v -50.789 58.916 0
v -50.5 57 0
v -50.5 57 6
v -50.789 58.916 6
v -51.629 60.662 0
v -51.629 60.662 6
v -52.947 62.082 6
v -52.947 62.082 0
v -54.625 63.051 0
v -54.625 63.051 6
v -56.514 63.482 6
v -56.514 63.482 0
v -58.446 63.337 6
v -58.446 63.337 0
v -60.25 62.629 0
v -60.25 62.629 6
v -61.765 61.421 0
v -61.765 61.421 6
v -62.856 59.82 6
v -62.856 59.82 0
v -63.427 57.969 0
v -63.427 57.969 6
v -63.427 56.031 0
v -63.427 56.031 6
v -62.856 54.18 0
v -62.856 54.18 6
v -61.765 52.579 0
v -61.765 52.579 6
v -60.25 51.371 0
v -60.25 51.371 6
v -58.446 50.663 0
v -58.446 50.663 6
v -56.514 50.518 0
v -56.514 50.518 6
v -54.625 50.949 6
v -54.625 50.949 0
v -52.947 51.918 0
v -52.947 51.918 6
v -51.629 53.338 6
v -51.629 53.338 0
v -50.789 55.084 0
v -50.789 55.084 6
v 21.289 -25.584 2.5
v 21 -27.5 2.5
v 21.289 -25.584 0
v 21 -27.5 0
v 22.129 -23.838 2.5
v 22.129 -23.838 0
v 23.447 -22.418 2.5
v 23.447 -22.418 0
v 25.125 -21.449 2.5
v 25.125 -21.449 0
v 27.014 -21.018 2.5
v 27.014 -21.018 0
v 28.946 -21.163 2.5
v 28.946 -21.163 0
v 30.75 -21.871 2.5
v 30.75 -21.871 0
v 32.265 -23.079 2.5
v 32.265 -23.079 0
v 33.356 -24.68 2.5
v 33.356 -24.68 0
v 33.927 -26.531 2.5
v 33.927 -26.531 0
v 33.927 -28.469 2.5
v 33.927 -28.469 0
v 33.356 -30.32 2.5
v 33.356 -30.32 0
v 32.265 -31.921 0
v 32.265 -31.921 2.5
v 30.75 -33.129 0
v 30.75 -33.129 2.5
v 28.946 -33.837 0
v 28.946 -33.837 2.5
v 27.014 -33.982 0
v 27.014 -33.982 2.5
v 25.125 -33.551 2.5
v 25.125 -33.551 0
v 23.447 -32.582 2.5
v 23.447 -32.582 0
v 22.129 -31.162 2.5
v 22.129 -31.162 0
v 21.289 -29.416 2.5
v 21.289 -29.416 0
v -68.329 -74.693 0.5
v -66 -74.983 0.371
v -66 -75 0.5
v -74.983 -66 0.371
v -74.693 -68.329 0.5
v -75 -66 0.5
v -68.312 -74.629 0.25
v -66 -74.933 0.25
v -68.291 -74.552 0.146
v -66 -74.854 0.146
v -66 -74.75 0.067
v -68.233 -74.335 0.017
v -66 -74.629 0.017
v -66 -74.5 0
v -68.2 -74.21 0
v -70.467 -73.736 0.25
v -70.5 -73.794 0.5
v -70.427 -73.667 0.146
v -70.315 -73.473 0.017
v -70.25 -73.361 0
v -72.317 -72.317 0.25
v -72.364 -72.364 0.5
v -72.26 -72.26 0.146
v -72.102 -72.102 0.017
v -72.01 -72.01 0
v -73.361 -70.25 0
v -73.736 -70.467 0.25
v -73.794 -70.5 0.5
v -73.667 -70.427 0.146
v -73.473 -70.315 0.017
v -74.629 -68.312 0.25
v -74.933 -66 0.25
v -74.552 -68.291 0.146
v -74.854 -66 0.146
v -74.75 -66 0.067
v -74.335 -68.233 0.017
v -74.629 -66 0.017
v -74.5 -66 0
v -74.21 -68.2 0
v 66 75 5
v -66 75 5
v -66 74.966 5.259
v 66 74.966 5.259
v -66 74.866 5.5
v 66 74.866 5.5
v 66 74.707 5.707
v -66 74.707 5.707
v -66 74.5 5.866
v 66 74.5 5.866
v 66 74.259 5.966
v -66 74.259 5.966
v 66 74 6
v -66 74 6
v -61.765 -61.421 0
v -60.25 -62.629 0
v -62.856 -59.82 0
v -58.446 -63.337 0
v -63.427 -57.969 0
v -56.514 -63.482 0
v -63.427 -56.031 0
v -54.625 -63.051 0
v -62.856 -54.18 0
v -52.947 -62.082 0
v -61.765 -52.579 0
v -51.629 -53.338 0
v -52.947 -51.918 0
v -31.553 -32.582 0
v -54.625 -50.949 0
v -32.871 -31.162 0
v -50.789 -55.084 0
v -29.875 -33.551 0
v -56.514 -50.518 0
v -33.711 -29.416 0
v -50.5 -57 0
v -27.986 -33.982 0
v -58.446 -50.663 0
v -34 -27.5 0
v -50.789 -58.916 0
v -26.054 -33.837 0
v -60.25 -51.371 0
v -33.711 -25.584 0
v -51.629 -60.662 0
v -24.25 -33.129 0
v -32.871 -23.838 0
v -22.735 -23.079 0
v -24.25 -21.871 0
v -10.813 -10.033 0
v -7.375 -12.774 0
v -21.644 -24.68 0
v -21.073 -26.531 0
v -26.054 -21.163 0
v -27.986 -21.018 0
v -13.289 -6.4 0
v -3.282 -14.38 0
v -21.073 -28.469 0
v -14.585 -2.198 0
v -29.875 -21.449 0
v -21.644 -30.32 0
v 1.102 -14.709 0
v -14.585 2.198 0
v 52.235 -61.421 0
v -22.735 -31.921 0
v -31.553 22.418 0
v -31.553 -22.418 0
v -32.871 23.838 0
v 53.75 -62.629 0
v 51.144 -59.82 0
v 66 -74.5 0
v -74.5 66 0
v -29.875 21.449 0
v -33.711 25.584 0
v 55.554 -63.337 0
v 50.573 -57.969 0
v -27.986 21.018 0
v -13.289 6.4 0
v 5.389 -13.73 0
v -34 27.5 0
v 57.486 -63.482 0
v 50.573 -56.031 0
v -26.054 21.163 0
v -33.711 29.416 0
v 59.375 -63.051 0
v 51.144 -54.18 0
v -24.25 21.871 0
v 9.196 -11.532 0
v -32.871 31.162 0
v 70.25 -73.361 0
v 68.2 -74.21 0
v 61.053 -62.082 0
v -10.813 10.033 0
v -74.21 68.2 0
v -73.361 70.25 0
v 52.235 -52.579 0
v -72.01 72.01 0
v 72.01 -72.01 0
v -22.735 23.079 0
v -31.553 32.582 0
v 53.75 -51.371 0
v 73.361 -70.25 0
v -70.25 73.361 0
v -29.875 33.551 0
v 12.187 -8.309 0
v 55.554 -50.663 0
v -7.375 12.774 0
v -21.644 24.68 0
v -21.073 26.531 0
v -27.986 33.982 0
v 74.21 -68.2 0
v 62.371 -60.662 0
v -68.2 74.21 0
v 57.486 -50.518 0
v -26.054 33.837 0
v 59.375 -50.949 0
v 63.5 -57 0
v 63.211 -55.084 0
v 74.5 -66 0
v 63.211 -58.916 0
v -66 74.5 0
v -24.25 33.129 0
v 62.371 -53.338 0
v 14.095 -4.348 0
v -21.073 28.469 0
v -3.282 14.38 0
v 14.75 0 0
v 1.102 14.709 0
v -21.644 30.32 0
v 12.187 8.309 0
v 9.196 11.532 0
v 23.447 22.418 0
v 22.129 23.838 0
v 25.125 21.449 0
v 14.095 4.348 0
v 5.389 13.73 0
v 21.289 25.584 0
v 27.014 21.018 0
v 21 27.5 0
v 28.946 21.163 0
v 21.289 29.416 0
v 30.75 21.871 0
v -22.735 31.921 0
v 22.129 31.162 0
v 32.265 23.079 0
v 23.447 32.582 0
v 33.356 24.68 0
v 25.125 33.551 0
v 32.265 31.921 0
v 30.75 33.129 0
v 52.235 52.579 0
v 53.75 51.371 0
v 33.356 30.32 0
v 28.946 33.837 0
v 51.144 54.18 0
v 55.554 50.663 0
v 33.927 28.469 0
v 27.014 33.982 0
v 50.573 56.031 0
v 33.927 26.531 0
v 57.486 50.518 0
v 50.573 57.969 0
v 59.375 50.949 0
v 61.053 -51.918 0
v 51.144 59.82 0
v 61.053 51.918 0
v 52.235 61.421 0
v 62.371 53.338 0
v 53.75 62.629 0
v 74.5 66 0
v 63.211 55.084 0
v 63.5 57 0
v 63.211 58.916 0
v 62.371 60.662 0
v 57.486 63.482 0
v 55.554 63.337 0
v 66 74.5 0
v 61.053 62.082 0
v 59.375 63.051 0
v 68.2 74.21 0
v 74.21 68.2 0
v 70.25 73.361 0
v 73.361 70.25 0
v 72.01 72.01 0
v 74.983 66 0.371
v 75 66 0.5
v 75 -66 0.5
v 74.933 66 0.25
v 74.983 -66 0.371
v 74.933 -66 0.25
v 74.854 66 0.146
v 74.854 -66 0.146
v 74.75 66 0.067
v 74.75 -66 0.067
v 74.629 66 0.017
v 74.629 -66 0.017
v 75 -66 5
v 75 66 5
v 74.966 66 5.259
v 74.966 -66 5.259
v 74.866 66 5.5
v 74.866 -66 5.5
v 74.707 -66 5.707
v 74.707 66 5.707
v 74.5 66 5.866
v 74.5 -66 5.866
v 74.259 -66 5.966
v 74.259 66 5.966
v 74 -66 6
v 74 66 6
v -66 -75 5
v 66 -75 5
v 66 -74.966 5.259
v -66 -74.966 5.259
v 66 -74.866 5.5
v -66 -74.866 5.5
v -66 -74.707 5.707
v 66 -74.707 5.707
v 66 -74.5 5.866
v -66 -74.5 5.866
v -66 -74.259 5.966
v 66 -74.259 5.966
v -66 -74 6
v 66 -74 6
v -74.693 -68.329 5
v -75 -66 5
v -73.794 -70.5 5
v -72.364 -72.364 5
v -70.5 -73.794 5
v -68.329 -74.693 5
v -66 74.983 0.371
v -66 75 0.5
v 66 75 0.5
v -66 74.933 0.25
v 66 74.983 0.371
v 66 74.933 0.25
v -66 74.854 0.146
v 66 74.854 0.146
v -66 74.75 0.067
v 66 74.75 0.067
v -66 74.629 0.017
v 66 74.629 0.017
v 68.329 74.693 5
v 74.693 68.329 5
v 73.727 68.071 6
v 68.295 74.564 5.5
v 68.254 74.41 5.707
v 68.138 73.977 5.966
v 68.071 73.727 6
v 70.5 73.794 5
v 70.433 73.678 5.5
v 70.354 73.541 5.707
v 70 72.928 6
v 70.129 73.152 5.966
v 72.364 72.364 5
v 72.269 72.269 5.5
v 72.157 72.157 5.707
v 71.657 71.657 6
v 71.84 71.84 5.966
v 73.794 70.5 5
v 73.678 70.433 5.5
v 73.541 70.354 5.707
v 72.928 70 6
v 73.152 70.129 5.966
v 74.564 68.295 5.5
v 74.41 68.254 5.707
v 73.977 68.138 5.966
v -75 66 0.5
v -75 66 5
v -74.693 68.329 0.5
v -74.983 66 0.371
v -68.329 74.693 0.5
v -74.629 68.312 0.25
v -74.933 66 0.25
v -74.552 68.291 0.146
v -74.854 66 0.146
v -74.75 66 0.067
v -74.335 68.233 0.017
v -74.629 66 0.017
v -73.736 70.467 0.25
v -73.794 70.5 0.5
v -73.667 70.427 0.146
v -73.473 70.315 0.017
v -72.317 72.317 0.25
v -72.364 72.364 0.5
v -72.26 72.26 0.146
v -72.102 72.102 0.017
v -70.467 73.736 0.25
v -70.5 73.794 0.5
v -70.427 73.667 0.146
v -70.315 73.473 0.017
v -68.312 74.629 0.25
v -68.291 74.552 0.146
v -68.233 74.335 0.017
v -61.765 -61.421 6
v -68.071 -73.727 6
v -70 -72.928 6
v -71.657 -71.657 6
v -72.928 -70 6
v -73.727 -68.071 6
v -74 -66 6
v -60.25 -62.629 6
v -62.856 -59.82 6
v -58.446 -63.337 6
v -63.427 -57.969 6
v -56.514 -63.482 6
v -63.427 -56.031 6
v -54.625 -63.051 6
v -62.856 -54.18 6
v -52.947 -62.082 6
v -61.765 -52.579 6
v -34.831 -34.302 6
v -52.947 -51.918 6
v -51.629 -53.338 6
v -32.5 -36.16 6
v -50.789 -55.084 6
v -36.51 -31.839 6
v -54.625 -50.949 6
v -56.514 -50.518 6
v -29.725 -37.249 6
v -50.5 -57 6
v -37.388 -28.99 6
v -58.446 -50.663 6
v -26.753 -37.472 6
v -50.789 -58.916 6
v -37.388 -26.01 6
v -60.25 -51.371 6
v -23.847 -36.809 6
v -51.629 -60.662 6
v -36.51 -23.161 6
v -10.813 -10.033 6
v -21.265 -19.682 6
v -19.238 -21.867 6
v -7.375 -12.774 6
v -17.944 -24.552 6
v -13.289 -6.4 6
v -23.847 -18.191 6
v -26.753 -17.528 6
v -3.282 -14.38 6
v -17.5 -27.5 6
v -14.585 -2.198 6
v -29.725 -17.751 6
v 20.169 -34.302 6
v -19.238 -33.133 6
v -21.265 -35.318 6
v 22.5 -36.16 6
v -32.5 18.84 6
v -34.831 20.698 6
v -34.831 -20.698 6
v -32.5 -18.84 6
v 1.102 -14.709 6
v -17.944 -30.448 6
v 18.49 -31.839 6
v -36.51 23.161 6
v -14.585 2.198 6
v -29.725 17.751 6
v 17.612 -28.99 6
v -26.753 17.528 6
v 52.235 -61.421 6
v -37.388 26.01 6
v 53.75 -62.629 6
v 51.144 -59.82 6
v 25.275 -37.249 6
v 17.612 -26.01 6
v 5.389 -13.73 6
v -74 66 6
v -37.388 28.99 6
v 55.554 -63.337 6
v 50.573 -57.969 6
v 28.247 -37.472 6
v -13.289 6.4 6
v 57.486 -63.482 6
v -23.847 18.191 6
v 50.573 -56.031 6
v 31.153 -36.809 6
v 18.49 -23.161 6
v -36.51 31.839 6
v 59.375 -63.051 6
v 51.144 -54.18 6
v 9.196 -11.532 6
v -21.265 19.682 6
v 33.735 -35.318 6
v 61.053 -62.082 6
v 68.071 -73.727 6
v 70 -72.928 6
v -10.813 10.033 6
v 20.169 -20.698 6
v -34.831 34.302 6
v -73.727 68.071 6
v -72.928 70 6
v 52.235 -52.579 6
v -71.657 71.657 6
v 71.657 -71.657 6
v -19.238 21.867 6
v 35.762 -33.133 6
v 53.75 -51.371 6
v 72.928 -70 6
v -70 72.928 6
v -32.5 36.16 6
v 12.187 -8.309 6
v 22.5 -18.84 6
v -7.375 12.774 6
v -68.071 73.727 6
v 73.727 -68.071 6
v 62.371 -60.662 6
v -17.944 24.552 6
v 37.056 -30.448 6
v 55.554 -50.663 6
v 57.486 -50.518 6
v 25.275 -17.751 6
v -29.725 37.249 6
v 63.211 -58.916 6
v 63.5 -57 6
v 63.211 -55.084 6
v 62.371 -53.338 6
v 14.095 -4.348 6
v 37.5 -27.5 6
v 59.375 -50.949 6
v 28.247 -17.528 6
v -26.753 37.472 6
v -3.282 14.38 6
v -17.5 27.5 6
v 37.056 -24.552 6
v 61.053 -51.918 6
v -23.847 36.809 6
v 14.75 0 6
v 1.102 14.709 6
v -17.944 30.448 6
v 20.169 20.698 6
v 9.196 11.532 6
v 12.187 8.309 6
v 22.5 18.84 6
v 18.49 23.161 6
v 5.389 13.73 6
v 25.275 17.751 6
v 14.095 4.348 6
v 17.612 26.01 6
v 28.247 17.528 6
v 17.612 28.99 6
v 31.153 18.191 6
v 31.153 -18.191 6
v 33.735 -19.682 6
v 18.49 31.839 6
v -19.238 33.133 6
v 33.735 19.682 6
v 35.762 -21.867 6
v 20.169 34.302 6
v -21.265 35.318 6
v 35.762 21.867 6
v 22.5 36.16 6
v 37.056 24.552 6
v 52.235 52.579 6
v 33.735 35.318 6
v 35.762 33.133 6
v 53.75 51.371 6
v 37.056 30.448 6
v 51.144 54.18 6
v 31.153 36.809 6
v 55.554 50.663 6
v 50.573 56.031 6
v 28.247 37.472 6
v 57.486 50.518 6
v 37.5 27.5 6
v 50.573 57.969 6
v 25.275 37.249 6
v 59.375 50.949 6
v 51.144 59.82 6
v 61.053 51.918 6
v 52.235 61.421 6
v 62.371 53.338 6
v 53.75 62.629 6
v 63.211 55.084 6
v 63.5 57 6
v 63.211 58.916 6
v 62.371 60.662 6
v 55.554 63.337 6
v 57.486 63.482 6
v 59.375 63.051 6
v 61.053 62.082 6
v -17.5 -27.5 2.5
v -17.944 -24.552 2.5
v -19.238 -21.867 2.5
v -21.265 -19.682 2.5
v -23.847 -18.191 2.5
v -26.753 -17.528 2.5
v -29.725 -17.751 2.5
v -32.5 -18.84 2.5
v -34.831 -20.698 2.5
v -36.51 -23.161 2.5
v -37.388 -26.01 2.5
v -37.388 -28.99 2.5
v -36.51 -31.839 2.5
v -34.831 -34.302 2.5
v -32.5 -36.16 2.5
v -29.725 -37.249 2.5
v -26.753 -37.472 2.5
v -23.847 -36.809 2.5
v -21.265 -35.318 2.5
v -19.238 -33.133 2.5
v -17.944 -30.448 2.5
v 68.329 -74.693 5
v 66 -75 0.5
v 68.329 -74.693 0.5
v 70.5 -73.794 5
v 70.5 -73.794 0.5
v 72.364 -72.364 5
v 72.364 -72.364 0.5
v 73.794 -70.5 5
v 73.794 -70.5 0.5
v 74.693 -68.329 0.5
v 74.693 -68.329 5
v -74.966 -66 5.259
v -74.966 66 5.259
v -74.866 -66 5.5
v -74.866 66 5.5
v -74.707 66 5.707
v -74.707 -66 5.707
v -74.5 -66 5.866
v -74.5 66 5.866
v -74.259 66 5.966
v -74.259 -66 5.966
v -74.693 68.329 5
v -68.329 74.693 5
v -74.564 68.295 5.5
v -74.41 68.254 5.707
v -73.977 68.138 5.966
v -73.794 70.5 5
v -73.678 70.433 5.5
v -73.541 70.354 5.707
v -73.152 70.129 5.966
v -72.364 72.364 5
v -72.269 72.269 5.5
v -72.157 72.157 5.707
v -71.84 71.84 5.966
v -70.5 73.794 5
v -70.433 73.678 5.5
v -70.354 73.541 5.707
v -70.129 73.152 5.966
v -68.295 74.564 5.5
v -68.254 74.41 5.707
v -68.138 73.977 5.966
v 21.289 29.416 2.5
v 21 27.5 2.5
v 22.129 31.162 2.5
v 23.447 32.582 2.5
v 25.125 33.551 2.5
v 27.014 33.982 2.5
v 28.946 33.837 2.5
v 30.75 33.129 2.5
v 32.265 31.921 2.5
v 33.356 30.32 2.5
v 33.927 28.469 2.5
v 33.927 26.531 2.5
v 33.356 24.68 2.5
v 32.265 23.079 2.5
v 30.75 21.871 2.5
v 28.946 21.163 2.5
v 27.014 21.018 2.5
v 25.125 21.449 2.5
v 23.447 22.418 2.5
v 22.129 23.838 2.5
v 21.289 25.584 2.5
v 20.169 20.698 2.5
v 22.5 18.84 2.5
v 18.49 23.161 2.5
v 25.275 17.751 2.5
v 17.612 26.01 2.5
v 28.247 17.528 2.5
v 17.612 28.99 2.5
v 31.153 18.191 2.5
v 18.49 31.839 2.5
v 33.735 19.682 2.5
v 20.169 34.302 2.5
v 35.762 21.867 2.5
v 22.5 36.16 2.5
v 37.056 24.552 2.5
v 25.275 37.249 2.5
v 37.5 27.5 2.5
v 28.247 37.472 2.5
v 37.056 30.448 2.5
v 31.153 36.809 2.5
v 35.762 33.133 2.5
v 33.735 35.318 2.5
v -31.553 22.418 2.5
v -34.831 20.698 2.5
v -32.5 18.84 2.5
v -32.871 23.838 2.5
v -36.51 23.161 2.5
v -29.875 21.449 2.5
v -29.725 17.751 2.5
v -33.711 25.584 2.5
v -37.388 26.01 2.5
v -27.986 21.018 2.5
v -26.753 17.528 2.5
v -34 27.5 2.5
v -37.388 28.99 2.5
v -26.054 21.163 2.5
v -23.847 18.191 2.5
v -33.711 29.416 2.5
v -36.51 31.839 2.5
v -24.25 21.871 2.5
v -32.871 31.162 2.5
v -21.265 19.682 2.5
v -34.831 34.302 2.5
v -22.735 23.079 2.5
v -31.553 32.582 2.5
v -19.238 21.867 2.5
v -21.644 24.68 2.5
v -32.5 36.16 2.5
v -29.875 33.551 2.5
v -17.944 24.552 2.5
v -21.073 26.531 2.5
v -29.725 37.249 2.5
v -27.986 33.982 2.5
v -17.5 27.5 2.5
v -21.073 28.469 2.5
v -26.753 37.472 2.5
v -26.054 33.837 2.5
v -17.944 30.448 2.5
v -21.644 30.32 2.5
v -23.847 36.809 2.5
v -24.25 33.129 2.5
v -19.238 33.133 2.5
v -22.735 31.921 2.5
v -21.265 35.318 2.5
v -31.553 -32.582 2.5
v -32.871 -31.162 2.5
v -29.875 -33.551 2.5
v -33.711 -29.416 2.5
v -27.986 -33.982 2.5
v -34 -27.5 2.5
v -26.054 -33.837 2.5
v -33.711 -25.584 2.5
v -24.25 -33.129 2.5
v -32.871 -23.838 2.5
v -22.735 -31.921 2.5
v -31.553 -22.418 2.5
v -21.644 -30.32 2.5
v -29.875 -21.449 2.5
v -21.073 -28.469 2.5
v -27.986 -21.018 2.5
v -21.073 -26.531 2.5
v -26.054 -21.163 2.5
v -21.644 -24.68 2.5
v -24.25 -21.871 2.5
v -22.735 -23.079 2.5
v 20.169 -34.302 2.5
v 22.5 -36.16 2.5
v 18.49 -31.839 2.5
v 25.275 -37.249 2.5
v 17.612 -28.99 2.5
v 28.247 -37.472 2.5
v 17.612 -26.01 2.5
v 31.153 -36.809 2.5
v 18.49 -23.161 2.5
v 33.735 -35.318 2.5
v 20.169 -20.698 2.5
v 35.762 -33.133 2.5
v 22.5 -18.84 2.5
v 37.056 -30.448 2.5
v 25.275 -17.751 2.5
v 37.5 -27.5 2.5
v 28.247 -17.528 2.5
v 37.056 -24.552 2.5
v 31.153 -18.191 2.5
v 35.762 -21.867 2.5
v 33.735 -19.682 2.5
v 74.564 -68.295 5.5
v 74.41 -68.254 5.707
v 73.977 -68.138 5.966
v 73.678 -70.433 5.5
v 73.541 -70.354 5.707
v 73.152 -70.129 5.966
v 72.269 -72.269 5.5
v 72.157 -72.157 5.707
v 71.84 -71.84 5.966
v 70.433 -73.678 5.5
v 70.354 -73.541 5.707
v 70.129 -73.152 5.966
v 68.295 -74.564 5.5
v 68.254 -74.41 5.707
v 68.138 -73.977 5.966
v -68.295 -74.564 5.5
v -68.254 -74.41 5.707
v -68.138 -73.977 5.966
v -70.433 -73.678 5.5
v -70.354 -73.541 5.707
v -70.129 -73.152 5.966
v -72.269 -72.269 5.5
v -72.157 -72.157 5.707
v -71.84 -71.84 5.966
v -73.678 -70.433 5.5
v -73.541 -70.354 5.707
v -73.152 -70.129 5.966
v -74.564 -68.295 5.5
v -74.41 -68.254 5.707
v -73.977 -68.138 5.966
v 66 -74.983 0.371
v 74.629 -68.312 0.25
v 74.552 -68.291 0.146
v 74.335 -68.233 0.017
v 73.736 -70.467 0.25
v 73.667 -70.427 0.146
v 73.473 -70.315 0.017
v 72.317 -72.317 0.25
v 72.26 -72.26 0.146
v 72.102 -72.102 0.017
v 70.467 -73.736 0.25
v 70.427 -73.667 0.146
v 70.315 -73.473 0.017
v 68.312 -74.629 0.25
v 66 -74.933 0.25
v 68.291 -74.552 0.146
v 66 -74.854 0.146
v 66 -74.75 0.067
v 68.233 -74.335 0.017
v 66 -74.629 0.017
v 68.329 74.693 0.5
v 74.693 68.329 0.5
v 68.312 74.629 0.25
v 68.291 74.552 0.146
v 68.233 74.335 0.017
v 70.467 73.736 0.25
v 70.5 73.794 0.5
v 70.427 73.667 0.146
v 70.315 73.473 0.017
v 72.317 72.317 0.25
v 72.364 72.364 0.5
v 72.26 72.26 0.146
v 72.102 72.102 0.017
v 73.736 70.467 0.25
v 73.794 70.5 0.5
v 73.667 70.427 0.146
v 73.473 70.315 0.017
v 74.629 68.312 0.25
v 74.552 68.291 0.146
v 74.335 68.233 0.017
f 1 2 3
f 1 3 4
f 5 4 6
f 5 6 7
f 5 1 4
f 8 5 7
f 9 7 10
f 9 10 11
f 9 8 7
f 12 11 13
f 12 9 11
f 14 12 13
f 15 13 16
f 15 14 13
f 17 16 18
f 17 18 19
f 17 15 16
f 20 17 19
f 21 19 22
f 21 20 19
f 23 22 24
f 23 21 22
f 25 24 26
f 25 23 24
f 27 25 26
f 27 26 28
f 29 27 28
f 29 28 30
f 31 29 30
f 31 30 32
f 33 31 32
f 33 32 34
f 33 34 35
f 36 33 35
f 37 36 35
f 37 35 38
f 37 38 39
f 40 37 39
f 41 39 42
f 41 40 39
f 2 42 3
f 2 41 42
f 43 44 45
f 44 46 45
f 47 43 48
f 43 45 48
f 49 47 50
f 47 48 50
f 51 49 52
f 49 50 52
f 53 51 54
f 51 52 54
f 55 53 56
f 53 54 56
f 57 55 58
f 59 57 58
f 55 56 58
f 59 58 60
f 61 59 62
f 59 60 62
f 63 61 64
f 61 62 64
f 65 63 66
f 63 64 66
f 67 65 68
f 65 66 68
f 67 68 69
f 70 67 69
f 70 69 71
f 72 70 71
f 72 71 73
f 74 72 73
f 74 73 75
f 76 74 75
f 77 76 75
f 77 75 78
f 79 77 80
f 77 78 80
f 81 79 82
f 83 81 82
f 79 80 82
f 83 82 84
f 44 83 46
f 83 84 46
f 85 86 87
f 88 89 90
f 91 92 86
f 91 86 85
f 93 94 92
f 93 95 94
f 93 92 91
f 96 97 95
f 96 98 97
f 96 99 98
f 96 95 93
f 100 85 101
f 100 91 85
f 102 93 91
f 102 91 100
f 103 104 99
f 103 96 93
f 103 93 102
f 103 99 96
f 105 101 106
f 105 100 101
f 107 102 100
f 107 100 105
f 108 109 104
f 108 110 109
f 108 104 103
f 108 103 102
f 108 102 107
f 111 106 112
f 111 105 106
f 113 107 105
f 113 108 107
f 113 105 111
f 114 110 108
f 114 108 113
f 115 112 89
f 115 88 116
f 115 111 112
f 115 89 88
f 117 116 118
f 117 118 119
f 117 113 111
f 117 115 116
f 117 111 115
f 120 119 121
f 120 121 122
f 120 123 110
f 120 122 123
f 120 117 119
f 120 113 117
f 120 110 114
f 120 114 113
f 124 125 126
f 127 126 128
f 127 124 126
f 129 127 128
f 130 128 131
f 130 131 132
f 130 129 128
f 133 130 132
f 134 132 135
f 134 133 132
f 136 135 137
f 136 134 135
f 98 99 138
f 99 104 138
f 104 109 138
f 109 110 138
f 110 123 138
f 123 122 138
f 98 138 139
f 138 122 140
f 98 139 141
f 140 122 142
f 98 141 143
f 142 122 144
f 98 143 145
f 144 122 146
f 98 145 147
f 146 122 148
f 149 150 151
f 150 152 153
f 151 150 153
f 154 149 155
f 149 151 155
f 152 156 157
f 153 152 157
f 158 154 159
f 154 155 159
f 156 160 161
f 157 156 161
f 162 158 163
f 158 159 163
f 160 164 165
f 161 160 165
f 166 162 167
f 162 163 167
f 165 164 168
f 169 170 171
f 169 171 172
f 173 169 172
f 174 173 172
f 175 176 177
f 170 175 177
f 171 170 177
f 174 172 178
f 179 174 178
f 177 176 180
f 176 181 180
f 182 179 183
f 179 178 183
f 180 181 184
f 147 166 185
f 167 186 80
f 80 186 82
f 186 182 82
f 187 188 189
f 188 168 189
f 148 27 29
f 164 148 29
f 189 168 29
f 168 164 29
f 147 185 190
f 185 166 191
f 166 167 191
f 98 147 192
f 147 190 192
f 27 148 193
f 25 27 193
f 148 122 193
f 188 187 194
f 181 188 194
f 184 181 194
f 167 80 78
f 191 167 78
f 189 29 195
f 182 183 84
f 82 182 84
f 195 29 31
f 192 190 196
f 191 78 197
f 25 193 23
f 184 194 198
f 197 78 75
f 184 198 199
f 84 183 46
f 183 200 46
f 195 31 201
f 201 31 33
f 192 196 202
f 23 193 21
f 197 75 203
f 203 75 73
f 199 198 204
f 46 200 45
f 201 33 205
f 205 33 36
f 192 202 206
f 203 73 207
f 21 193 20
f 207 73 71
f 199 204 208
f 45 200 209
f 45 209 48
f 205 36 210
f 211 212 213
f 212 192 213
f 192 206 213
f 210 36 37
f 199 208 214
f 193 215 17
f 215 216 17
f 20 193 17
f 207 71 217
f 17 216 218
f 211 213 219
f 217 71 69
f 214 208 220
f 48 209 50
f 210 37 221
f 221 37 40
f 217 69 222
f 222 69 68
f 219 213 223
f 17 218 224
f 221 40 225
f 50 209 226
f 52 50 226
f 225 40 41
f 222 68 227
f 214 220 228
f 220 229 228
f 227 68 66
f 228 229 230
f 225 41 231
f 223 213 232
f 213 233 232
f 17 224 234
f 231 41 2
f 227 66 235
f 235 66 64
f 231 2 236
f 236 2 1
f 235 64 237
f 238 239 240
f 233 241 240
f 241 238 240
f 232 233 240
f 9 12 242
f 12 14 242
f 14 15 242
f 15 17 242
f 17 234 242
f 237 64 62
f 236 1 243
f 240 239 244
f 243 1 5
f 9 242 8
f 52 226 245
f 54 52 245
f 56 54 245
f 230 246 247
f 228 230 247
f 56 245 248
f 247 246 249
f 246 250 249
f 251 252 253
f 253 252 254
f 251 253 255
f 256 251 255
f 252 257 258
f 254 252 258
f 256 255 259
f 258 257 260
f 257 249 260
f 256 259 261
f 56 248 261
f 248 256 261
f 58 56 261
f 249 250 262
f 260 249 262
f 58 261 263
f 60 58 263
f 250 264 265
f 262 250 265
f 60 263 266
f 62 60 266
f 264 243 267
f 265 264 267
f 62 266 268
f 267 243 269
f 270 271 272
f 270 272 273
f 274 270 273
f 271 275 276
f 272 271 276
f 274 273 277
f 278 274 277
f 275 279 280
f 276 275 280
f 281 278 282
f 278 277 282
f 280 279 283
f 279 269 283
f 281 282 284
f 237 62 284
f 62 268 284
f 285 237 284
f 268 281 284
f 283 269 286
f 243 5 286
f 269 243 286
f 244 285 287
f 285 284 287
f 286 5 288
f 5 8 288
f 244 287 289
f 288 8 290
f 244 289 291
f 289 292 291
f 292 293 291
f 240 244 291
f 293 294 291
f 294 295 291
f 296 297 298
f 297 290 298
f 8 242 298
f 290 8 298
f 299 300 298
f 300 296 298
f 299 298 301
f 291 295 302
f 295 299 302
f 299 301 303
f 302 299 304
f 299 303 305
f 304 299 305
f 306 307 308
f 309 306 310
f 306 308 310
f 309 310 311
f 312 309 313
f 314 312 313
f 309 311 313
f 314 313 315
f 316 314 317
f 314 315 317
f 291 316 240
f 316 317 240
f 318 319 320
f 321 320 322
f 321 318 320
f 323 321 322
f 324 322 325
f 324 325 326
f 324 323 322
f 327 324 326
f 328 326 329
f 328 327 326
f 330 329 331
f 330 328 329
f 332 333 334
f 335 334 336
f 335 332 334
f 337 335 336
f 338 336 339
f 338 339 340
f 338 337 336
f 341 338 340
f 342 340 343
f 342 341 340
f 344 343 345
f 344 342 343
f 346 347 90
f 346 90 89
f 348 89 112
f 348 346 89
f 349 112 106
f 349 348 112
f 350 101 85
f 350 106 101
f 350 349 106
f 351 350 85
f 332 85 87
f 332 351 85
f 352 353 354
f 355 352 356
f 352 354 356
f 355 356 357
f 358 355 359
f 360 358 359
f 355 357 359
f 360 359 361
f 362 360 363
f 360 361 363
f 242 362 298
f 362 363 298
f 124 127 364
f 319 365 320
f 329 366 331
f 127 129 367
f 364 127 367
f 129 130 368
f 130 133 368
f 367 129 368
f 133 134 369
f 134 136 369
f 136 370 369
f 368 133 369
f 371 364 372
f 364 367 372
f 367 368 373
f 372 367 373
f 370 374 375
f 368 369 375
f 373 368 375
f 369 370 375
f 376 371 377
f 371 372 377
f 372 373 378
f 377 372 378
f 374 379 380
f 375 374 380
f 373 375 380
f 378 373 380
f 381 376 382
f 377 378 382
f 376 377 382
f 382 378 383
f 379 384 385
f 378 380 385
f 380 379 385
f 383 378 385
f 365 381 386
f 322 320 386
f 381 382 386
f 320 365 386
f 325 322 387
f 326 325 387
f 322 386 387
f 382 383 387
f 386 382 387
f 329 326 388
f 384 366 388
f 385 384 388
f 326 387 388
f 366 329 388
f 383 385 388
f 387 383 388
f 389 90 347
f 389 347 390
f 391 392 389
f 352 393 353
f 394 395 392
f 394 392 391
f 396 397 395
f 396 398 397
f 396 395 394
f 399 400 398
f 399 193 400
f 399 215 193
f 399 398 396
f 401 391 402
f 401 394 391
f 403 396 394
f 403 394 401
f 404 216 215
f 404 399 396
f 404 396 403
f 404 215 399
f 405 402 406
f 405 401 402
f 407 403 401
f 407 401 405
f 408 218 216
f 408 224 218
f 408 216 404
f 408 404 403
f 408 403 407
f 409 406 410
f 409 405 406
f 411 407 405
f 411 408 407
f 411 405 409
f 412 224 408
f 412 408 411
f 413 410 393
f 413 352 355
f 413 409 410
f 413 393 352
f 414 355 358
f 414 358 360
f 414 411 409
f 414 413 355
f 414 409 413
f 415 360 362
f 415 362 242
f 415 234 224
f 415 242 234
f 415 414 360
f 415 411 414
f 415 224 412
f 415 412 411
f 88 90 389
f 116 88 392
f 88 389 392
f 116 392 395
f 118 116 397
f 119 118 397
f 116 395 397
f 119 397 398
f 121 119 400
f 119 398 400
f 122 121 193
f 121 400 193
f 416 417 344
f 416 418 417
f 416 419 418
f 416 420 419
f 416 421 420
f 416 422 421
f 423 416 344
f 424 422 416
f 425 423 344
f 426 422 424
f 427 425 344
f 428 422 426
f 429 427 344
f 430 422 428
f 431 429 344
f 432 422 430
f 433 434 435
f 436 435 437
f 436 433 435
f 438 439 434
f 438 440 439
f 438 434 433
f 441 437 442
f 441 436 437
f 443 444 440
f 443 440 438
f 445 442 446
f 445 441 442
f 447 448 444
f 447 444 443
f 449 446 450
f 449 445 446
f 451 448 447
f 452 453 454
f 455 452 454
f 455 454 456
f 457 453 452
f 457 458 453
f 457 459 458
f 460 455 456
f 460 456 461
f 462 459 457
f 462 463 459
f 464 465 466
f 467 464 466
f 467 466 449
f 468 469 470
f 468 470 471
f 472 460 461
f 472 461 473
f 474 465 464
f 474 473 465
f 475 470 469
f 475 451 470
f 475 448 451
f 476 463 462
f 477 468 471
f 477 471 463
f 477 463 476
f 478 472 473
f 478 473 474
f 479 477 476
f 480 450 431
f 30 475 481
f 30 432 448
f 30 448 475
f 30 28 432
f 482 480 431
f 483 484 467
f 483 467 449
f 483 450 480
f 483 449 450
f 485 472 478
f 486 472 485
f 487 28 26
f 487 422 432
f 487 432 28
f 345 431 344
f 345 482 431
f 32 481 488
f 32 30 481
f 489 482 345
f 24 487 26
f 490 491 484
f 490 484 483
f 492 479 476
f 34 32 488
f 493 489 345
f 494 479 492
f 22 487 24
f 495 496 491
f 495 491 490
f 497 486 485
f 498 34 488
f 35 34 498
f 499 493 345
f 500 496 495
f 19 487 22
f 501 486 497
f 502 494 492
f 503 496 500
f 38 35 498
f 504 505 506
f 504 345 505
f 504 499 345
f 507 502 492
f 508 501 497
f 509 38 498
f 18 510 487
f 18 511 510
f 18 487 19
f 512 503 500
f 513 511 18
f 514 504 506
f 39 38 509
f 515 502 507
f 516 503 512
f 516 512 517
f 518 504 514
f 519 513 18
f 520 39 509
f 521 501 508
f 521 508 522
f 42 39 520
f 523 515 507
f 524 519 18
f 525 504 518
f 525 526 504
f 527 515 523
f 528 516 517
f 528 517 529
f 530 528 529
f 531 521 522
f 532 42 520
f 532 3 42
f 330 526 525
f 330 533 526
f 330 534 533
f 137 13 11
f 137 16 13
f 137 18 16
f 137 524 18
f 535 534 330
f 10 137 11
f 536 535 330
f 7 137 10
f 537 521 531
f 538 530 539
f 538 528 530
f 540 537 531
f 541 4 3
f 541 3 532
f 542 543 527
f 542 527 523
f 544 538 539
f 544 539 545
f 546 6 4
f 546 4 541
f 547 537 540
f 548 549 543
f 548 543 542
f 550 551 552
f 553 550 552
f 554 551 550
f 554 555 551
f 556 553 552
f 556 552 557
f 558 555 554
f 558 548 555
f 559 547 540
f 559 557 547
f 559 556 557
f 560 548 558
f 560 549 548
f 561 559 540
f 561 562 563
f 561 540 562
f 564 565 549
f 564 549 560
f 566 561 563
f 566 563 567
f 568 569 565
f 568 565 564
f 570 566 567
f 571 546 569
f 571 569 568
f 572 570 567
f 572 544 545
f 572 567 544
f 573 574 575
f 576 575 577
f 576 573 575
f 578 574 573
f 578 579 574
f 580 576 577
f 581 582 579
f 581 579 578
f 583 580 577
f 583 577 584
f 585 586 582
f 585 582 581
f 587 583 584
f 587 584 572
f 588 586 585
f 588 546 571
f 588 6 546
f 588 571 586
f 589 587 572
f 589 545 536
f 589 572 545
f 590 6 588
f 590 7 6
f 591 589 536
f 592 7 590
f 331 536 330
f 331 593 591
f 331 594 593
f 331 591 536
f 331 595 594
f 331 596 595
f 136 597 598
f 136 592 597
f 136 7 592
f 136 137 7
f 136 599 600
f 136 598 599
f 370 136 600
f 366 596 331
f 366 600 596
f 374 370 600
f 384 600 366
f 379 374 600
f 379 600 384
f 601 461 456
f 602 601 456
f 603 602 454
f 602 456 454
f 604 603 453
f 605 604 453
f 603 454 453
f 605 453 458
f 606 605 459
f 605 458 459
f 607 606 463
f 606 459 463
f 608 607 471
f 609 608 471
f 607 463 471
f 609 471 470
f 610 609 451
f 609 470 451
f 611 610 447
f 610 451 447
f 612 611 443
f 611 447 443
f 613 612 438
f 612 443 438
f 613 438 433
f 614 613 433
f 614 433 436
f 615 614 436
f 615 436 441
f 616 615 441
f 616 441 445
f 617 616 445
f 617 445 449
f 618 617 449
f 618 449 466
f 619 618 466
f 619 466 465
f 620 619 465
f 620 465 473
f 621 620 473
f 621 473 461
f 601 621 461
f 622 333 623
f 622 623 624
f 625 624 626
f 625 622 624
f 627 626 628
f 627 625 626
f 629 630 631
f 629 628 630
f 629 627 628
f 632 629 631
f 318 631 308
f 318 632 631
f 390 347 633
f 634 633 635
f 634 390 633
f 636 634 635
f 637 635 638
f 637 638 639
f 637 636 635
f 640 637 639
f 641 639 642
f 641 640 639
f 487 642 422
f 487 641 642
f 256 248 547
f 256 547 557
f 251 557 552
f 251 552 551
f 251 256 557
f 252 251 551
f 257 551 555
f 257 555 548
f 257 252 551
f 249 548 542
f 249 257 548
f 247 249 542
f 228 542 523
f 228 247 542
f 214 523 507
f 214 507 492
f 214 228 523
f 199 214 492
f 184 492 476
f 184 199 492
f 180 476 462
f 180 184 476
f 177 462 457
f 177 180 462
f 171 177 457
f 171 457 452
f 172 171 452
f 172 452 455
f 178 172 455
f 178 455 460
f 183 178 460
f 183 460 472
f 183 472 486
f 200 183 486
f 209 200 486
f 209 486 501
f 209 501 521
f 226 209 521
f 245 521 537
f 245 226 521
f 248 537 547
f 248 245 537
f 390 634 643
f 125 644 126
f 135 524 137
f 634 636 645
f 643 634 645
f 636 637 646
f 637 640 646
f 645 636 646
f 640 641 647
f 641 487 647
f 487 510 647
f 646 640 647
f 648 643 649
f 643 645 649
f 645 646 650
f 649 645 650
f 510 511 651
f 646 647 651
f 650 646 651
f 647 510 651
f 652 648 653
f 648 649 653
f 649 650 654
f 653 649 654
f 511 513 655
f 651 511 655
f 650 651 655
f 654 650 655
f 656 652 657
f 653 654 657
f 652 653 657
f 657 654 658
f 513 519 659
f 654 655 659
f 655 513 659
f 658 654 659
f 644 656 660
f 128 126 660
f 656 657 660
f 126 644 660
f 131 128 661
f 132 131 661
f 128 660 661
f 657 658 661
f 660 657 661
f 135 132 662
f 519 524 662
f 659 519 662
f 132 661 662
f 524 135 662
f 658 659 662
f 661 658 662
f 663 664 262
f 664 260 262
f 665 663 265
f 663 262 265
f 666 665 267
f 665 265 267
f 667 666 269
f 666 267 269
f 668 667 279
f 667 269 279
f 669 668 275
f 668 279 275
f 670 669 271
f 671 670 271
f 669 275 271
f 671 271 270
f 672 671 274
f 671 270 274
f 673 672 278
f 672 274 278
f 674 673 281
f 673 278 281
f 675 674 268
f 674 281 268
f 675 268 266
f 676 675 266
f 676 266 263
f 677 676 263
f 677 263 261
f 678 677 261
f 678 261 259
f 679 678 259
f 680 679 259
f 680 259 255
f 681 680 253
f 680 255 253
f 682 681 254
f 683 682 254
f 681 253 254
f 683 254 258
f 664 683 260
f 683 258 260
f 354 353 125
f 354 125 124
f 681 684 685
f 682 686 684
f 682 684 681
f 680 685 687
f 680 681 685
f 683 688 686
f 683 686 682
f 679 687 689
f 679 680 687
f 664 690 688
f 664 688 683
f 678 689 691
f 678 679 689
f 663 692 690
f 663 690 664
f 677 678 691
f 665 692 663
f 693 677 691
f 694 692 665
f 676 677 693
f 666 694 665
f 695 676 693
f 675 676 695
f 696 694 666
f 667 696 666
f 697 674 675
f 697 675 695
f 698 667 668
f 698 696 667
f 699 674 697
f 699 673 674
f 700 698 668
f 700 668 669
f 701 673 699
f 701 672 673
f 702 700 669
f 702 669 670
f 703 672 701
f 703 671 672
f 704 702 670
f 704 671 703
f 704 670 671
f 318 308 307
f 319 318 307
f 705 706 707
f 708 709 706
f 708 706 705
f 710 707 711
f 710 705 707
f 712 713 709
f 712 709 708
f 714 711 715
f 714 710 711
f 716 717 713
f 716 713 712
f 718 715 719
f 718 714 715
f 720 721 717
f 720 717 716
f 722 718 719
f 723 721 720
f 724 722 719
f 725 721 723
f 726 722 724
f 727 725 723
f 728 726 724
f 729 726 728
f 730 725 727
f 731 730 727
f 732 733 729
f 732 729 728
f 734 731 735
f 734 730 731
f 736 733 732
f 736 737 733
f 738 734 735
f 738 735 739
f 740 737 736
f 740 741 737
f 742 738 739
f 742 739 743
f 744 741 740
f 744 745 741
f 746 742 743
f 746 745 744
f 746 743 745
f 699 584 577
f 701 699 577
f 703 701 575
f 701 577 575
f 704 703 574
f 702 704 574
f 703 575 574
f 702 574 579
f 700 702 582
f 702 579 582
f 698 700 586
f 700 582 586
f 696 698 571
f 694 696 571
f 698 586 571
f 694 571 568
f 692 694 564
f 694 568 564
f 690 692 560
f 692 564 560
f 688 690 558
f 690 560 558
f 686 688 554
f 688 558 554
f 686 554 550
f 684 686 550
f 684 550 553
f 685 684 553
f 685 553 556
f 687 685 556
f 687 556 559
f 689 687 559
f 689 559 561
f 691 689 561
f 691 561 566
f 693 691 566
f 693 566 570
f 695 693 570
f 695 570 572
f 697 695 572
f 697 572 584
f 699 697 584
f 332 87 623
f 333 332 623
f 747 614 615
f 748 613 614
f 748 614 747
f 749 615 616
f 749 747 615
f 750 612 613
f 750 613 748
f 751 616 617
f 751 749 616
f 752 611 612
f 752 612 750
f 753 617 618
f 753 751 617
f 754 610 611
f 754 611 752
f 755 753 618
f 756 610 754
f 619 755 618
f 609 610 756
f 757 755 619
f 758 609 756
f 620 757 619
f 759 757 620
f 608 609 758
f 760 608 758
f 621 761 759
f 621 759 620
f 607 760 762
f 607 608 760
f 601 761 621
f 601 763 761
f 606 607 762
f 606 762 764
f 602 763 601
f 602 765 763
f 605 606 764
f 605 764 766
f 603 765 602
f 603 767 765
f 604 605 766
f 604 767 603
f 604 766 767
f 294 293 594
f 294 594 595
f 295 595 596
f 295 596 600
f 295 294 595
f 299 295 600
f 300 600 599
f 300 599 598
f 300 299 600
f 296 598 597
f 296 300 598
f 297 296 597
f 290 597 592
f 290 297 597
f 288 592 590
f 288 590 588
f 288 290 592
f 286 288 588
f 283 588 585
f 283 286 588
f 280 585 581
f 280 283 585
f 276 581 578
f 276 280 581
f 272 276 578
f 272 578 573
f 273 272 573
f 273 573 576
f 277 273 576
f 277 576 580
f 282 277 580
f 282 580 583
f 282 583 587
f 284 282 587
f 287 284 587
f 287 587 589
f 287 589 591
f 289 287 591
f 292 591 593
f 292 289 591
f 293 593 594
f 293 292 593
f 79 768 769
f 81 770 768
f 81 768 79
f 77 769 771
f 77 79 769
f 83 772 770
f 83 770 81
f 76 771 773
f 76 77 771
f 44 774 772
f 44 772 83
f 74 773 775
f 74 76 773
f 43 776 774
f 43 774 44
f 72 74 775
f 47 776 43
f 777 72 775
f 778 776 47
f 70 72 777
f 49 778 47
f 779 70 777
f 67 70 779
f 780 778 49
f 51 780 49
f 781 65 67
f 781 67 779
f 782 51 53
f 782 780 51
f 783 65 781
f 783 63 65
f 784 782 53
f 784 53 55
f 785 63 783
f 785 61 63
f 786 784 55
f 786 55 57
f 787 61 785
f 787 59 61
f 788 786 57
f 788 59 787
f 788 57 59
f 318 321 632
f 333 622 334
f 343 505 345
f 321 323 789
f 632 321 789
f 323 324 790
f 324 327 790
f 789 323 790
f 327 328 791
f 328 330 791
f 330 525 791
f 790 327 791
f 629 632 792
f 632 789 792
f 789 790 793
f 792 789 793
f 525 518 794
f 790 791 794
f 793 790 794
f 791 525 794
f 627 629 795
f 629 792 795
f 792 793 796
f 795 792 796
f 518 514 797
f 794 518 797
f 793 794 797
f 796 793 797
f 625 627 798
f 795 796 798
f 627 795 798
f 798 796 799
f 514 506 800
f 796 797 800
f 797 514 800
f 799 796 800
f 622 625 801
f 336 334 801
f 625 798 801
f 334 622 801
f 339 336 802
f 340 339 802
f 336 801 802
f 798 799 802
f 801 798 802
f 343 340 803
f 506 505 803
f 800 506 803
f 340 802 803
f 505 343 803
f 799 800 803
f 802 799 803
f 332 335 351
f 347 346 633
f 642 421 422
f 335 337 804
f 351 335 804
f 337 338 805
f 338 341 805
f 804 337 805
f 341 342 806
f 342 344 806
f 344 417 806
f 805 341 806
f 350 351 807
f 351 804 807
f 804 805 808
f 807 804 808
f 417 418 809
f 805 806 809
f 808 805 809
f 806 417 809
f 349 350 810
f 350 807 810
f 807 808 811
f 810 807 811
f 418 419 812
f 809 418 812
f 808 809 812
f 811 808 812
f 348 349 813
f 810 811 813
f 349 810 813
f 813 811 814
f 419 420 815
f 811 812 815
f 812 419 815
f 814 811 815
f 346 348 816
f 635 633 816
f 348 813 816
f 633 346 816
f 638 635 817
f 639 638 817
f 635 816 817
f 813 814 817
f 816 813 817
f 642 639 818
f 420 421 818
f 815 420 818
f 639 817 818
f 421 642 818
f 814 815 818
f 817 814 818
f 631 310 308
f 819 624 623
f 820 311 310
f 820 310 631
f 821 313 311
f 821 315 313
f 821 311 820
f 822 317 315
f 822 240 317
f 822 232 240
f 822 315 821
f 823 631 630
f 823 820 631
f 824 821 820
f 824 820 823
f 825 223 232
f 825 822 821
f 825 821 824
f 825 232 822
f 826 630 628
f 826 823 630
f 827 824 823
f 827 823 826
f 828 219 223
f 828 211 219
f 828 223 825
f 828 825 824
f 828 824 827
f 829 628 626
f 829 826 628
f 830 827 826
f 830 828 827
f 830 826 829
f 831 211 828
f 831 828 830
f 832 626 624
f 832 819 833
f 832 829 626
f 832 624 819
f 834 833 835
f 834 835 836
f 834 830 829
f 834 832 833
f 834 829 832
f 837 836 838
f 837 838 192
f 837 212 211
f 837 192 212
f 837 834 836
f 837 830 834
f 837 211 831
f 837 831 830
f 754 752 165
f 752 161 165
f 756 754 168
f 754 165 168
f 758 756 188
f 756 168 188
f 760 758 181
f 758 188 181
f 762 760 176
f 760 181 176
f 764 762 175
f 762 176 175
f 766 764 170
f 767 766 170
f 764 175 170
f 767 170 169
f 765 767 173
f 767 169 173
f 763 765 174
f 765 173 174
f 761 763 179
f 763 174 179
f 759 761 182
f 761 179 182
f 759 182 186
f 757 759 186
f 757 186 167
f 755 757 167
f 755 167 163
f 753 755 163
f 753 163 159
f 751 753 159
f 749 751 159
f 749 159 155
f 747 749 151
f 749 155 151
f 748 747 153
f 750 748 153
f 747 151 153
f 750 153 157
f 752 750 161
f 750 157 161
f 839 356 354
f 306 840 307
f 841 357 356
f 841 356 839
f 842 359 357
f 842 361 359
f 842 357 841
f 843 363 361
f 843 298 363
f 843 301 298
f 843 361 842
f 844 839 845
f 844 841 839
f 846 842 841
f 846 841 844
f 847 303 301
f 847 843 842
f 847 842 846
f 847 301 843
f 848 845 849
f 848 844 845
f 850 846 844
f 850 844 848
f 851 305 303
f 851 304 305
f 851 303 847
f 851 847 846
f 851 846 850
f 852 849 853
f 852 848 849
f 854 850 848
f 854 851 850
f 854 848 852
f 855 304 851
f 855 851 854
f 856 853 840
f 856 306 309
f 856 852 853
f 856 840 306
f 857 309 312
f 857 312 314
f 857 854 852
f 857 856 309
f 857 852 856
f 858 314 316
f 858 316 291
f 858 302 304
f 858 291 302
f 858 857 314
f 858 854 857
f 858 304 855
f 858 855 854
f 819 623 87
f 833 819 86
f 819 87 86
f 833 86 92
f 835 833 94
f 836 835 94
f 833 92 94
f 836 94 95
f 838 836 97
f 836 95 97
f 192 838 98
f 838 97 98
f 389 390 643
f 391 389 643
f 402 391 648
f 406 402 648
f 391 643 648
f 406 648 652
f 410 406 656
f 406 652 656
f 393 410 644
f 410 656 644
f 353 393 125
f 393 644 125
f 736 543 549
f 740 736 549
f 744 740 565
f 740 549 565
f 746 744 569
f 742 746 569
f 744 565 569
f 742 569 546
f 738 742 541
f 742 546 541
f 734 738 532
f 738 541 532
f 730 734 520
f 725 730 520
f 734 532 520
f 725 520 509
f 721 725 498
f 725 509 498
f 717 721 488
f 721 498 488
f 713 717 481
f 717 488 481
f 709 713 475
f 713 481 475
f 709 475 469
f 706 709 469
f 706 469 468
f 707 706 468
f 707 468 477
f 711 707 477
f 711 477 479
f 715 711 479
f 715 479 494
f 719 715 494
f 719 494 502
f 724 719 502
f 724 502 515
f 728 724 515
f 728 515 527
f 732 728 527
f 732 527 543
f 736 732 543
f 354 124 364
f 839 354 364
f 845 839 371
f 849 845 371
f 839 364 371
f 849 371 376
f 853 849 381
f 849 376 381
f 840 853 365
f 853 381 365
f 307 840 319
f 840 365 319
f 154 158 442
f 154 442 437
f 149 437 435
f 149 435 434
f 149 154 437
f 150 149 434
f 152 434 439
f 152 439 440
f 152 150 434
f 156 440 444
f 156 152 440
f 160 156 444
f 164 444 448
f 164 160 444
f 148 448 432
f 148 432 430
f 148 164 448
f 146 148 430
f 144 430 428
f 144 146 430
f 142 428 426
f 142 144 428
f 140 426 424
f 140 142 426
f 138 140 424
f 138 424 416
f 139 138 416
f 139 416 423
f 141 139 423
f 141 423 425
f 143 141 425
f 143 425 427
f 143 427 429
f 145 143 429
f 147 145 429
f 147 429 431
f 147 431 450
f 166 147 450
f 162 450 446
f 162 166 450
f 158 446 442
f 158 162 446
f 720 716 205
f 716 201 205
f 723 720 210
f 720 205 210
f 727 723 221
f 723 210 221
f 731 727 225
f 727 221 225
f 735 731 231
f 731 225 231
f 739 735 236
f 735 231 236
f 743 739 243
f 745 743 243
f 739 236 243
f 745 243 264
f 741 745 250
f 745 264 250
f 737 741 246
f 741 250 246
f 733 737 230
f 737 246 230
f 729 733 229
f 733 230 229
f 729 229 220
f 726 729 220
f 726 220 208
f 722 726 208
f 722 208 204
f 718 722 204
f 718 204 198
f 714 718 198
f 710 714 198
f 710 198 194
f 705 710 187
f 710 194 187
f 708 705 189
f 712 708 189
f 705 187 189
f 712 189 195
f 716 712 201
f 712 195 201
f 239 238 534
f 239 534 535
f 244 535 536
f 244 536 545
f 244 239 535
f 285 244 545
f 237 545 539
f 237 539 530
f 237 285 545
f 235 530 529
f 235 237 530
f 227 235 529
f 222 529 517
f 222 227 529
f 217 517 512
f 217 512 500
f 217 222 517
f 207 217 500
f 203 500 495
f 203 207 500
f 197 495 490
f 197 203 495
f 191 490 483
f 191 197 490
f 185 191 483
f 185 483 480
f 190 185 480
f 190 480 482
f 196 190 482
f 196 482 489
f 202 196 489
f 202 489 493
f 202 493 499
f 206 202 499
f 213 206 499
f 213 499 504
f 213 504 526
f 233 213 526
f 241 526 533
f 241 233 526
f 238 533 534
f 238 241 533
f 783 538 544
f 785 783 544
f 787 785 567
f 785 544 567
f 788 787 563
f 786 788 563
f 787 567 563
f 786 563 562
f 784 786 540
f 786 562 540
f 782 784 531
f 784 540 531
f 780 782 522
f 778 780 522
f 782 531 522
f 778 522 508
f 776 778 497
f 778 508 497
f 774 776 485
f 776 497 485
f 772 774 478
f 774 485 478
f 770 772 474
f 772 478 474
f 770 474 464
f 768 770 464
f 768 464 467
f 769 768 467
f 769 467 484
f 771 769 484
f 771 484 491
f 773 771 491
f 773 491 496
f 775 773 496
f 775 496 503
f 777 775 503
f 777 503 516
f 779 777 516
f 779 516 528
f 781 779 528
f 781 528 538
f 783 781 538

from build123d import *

# Parameters (mm, degrees)
F0_W           = 150
F0_H           = 150
F0_R           = 6.5
F0_R_2         = 14.75
F1_DEPTH       = 6
F2_R           = 9
F4_D           = 13
F4_CBORE_D     = 20
F4_CBORE_DEPTH = 3.5
F5_R           = 1
F6_R           = 0.5


with BuildPart() as f1:
    # F0 (on Top) → F1 (new body)
    with BuildSketch(Plane.XY):
        Rectangle(F0_W, F0_H)
        with Locations((-57, -57)):
            Circle(F0_R, mode=Mode.SUBTRACT)
        with Locations((57, -57)):
            Circle(F0_R, mode=Mode.SUBTRACT)
        with Locations((-57, 57)):
            Circle(F0_R, mode=Mode.SUBTRACT)
        Circle(F0_R_2, mode=Mode.SUBTRACT)
        with Locations((57, 57)):
            Circle(F0_R, mode=Mode.SUBTRACT)
    extrude(amount=F1_DEPTH)

    # F2
    f2_edges = [f1.edges().sort_by_distance(p)[0] for p in [
        (-75, -75, 3),
        (-75, 75, 3),
        (75, -75, 3),
        (75, 75, 3),
    ]]
    fillet(f2_edges, radius=F2_R)

    # F4 (through all)
    with Locations(Plane.XY.offset(6)):
        with Locations((-27.5, 27.5), (27.5, 27.5), (27.5, -27.5), (-27.5, -27.5)):
            CounterBoreHole(F4_D / 2, F4_CBORE_D / 2, F4_CBORE_DEPTH)

    # F5
    f5_edges = [f1.edges().sort_by_distance(p)[0] for p in [
        (-72.363961, 72.363961, 6),
        (0, 75, 6),
        (-75, 0, 6),
    ]]
    fillet(f5_edges, radius=F5_R)

    # F6
    f6_edges = [f1.edges().sort_by_distance(p)[0] for p in [
        (-75, 66, 2.5),
        (-75, 0, 5),
        (-75, 0, 0),
        (-75, -66, 2.5),
        (-66, -75, 2.5),
        (0, -75, 5),
        (0, -75, 0),
        (66, -75, 2.5),
    ]]
    fillet(f6_edges, radius=F6_R)


solid = f1.part
